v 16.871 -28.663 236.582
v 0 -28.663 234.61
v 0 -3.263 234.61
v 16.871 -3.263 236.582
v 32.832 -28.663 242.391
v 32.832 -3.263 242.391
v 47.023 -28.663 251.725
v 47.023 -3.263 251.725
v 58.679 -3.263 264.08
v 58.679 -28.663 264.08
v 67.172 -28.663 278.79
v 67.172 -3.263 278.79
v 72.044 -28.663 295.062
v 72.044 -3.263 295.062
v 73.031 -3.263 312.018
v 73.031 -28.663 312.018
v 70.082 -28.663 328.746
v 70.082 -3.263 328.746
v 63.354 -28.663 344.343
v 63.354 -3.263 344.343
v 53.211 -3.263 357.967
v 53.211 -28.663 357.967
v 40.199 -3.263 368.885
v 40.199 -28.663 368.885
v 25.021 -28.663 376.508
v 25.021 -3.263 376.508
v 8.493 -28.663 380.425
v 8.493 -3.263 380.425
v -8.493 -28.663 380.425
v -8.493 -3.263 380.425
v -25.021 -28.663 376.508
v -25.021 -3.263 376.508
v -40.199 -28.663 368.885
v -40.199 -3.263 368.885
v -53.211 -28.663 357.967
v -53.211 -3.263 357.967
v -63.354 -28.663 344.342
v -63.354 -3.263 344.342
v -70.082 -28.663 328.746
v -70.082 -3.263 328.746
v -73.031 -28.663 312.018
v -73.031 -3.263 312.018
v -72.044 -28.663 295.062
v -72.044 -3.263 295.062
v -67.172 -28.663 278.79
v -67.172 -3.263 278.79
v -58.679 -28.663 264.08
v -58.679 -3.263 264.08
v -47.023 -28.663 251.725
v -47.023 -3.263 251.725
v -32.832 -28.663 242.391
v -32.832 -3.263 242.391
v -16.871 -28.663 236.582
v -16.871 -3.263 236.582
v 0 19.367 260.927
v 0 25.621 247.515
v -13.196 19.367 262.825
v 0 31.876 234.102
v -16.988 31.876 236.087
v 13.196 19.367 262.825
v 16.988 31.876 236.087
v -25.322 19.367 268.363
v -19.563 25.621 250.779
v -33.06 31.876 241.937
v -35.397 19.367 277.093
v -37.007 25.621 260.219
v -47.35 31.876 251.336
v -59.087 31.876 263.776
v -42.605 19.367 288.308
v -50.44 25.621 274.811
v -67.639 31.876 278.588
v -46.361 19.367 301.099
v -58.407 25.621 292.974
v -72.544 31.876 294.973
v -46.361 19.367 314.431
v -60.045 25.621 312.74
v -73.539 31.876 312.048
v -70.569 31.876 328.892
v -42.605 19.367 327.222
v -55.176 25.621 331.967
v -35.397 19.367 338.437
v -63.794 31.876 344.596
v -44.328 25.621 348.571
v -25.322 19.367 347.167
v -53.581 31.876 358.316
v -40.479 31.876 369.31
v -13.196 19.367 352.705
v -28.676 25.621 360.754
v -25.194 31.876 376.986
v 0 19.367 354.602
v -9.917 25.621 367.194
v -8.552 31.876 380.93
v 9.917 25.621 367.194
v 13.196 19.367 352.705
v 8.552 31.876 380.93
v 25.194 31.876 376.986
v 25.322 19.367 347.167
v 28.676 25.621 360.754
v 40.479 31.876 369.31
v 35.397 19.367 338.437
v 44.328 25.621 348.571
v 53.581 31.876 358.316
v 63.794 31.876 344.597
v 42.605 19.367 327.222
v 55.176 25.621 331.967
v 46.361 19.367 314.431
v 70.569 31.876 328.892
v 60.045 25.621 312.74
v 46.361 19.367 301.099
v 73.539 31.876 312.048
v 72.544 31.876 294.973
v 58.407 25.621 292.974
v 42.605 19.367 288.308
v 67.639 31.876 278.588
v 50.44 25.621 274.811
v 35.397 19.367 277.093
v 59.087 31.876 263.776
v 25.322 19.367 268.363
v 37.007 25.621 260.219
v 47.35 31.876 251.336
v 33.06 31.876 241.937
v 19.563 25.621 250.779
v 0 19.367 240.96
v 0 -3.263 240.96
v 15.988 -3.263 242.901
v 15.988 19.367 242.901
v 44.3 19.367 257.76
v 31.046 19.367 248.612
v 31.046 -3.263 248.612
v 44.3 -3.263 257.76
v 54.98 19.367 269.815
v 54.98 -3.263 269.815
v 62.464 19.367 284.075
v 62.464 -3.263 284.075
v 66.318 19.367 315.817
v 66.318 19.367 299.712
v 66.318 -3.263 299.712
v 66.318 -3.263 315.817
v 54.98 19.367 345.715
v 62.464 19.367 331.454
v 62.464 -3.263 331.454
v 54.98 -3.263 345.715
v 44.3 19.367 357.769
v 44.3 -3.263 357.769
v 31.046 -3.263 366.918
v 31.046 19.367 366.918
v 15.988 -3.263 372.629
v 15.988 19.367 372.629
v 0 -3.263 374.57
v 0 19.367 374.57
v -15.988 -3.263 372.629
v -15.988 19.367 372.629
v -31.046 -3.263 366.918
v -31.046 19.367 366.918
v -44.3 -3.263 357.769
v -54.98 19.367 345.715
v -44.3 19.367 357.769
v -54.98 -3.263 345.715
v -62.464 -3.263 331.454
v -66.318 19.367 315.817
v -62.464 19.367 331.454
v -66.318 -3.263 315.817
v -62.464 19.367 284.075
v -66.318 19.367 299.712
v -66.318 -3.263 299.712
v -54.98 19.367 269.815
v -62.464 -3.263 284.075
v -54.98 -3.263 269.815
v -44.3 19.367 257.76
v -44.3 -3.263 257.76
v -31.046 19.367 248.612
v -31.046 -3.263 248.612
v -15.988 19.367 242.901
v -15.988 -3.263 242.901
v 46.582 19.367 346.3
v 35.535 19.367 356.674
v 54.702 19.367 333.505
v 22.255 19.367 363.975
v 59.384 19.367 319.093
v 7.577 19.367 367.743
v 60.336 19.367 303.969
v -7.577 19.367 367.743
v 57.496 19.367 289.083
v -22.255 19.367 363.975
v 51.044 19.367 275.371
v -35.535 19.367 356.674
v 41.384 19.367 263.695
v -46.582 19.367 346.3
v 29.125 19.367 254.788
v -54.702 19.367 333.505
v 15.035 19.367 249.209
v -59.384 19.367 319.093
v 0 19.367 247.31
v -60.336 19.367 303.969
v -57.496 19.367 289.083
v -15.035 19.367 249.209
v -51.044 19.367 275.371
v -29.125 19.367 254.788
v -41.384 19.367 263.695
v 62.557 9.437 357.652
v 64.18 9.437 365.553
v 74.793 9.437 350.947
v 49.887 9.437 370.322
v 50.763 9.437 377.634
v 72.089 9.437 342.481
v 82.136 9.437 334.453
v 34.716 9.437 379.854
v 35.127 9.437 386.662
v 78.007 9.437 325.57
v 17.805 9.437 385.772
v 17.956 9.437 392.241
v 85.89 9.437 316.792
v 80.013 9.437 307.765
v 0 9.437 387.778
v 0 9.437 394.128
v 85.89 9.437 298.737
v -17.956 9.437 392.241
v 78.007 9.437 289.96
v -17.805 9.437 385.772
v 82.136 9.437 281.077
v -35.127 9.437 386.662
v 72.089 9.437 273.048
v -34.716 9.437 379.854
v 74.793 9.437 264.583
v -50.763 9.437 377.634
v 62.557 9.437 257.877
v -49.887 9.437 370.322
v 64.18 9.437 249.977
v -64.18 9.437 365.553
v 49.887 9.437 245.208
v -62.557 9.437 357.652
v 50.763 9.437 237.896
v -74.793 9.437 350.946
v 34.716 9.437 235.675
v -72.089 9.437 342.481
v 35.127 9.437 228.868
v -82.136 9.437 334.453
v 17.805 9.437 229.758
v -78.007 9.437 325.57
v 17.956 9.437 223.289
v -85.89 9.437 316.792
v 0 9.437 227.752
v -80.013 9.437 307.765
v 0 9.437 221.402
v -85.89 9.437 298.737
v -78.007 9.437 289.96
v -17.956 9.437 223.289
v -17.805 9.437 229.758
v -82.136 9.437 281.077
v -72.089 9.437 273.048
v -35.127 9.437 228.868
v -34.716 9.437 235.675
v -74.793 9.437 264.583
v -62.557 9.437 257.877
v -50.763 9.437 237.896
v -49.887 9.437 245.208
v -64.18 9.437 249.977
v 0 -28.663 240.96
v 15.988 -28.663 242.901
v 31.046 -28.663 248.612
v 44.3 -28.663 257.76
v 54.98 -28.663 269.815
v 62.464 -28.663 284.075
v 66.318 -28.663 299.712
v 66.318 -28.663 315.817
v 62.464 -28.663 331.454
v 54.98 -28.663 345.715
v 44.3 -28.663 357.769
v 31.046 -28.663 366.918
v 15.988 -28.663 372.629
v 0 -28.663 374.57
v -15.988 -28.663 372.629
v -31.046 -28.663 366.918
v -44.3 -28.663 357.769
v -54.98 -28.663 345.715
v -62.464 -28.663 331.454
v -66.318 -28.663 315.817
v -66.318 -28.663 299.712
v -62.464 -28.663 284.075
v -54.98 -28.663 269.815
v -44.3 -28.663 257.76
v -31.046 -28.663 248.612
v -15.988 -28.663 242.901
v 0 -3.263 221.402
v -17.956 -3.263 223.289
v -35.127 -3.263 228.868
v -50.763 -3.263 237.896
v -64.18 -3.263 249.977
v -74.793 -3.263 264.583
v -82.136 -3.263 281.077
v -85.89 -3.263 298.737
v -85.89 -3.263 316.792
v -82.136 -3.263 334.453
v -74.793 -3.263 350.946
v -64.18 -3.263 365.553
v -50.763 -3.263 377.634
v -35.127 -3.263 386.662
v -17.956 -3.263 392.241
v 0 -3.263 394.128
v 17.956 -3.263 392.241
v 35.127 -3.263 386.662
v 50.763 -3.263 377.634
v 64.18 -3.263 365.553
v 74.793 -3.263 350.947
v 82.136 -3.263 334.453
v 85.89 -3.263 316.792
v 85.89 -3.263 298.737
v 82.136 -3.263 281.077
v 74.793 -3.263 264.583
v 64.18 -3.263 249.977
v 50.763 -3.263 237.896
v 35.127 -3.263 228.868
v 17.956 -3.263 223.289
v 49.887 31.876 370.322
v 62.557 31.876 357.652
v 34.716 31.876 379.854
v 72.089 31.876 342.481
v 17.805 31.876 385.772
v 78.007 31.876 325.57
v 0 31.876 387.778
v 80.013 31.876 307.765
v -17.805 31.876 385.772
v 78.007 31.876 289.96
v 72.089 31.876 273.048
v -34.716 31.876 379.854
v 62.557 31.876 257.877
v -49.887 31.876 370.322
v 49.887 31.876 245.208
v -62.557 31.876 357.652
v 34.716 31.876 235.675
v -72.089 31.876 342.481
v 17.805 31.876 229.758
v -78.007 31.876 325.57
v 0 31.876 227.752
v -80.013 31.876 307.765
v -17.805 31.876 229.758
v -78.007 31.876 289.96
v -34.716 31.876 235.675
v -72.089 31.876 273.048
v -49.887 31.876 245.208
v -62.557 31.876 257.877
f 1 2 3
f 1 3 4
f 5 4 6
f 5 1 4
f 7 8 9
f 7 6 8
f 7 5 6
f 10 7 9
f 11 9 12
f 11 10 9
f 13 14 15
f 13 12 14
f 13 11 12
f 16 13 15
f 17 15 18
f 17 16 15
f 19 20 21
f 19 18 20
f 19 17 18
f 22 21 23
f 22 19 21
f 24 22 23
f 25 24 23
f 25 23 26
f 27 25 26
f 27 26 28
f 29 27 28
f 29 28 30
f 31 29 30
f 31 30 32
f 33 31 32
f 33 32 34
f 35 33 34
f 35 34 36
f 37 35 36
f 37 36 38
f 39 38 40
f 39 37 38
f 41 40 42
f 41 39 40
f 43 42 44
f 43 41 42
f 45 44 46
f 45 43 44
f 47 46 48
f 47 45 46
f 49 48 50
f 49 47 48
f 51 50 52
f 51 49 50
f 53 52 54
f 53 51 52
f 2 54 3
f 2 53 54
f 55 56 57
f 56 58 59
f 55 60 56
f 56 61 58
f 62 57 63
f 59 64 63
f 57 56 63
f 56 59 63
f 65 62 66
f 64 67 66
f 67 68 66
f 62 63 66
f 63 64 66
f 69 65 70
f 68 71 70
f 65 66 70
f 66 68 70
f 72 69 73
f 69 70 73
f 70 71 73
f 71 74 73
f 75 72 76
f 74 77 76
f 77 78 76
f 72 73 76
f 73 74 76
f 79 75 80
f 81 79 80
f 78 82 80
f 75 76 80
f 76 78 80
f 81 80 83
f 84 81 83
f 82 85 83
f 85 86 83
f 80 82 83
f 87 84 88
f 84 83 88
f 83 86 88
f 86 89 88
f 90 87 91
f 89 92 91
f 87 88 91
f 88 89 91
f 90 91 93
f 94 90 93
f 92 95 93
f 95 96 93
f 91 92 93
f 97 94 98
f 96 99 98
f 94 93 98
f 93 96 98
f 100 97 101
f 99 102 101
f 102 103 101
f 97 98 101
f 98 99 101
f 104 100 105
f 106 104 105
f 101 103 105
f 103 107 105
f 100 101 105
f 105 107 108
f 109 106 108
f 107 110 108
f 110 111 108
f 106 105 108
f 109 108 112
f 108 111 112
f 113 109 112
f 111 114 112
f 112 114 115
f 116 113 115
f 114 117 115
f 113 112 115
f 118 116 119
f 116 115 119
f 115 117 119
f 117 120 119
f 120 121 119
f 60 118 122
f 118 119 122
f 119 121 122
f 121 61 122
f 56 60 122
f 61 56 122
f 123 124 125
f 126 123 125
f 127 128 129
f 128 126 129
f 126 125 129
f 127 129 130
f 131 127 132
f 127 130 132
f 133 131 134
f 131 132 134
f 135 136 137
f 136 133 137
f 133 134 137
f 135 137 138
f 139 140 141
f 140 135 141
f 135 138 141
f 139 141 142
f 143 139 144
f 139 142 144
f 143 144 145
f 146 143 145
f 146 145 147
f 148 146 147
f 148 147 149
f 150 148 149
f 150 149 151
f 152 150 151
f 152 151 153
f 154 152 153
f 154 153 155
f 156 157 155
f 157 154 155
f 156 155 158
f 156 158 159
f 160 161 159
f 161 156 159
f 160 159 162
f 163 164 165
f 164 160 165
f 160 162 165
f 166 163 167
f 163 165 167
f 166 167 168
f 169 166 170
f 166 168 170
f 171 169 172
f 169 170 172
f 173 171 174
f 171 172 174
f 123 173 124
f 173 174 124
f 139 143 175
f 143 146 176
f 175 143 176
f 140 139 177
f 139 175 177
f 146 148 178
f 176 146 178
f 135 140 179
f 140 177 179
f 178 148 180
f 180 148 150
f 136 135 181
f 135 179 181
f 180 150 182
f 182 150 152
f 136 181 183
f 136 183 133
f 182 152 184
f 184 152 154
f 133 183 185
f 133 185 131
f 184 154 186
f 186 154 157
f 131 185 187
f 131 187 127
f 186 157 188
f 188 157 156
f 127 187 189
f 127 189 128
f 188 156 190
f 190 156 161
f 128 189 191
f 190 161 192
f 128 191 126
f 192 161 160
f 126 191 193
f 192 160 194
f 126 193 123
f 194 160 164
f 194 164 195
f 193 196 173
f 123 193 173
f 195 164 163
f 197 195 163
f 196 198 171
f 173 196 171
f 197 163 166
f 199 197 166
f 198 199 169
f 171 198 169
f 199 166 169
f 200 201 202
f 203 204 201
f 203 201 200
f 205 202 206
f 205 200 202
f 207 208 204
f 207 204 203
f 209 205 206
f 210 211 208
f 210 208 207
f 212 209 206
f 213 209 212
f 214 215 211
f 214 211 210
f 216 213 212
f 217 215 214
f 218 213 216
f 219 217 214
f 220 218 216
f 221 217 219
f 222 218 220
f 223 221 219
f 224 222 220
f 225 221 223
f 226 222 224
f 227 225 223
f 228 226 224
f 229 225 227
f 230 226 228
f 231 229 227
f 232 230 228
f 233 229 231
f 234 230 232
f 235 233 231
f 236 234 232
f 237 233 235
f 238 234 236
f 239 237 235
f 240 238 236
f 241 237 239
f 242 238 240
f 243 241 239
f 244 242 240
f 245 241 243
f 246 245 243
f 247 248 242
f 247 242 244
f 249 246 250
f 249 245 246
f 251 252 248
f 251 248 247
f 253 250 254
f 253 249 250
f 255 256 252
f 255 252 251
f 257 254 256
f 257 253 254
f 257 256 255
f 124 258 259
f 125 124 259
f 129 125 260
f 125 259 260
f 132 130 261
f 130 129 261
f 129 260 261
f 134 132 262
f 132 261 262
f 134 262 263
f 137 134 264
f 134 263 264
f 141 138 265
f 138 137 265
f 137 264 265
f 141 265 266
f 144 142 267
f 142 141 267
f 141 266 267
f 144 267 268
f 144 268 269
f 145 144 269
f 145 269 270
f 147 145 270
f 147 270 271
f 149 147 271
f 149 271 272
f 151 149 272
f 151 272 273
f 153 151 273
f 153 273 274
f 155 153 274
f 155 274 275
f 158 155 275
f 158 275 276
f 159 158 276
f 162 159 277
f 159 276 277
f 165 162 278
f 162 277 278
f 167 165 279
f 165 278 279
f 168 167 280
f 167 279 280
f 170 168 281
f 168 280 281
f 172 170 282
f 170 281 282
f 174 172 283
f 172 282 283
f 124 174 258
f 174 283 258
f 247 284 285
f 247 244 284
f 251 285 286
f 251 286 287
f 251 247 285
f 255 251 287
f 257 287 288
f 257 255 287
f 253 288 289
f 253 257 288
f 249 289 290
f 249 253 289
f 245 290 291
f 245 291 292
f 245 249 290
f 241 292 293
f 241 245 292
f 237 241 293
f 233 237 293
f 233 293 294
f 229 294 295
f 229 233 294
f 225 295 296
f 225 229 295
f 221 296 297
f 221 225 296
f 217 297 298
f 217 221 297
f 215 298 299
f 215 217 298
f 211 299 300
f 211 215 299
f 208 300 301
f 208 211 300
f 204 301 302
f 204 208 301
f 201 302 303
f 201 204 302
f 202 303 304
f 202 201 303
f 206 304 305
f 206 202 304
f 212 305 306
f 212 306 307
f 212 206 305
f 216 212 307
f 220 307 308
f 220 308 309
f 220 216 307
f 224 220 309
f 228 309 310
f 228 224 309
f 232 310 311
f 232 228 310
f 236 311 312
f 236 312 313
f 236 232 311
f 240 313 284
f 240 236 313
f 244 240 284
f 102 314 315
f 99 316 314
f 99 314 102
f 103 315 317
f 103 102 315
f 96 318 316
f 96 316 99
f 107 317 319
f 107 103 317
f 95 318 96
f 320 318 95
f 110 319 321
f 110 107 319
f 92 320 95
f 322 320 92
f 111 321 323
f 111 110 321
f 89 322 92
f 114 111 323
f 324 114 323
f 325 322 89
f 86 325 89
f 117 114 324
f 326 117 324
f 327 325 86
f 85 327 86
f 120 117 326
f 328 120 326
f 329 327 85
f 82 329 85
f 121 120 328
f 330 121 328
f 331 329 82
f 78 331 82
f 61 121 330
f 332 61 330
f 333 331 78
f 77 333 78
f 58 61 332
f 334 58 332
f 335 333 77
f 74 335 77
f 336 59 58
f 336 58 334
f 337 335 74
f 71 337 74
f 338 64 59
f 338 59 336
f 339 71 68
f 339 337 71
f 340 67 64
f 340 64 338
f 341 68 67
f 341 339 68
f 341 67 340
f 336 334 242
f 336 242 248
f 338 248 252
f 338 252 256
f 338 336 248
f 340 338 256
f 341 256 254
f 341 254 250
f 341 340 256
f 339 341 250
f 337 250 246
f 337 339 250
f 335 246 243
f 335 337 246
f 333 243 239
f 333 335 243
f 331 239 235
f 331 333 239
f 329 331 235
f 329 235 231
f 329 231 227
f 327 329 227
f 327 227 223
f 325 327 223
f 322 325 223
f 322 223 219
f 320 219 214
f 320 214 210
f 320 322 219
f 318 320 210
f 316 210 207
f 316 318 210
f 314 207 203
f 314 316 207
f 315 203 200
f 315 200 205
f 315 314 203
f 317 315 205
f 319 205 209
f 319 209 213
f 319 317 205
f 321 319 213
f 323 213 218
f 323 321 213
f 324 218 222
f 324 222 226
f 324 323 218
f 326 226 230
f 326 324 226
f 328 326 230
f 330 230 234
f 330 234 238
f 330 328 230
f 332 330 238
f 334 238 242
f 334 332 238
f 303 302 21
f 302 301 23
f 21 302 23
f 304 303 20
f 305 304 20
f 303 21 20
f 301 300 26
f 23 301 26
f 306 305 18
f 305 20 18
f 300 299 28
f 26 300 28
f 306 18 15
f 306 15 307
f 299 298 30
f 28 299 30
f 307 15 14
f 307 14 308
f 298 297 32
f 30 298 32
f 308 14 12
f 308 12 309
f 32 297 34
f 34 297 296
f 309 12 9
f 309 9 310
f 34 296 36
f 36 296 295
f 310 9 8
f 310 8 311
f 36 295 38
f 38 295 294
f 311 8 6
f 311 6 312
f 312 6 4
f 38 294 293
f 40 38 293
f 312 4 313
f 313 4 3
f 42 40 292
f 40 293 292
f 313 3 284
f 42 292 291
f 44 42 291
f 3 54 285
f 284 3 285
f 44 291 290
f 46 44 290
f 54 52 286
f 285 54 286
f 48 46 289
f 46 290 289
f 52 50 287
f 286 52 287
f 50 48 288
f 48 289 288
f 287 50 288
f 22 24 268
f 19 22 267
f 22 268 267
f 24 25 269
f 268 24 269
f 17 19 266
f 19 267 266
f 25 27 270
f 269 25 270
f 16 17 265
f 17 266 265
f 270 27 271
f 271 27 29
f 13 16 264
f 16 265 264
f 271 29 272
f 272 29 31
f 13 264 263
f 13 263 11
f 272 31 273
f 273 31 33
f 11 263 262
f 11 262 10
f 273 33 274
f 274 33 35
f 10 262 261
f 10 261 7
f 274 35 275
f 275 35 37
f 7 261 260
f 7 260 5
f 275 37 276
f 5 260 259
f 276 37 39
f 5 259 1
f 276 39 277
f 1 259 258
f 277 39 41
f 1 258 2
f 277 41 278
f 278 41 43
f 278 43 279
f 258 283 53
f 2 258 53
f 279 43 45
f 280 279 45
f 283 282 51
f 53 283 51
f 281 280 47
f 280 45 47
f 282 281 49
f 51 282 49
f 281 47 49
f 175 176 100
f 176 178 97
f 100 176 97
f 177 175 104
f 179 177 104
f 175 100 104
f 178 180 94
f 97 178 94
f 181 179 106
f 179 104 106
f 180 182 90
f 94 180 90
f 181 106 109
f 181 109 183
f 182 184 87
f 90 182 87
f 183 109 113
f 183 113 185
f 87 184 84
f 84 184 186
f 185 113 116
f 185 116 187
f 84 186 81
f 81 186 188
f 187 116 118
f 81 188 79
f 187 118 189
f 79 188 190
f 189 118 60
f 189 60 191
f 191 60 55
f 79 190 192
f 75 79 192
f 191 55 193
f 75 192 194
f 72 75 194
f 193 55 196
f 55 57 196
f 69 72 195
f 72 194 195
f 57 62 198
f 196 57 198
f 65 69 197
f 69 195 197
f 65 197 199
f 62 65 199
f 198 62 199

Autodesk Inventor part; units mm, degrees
sketch "Sketch2" plane through (0, 0, 0) normal (0, 1, 0) x (-1, 0, 0)
  line L0 (0, -114.5678) -> (107.9834, -114.5678)
  line L1 (107.9834, -114.5678) -> (107.9834, 108.3126)
  line L2 (107.9834, 108.3126) -> (0, 108.3126)
  line L3 (0, 108.3126) -> (0, -114.5678)
  point P0 (0, 0)
extrude "Extrusion1" [suppressed]
ref_plane "Work Plane4" through (0, -133.7486, -73.152) normal (-1, 0, 0) x (0, 0, 1)
sketch "Sketch3" plane through (0, -133.7486, -73.152) normal (-1, 0, 0) x (0, 0, 1)
  line L0 (6.35, 143.6785) -> (6.35, 121.0486)
  line L1 (6.35, 121.0486) -> (6.35, 95.6486)
  line L2 (0, 95.6486) -> (6.35, 95.6486)
  line L3 (0, 121.0486) -> (-13.208, 121.0486)
  line L4 (-13.208, 121.0486) -> (-13.208, 133.7486) projected
  line L5 (-13.208, 121.0486) -> (-13.208, 133.7486)
  line L6 (-13.208, 133.7486) -> (-6.858, 133.7486)
  line L7 (-6.858, 133.7486) -> (-6.858, 156.1875)
  line L8 (-0.508, 156.1875) -> (26.3176, 143.6785) projected
  line L9 (-6.858, 156.1875) -> (-0.508, 156.1875)
  line L10 (-0.508, 156.1875) -> (26.3176, 143.6785)
  line L11 (12.7, 143.6785) -> (26.3176, 143.6785)
  line L12 (6.35, 143.6785) -> (12.7, 143.6785)
  line L13 (314.1117, 153.1152) -> (314.1117, 130.4853)
  line L14 (314.1117, 130.4853) -> (314.1117, 105.0853)
  line L15 (307.7617, 105.0853) -> (314.1117, 105.0853)
  line L16 (307.7617, 130.4853) -> (294.5537, 130.4853)
  line L17 (294.5537, 130.4853) -> (294.5537, 143.1853)
  line L18 (294.5537, 143.1853) -> (300.9037, 143.1853)
  line L19 (300.9037, 143.1853) -> (300.9037, 165.6242)
  line L20 (307.2537, 165.6242) -> (334.0793, 153.1152)
  line L21 (300.9037, 165.6242) -> (307.2537, 165.6242)
  line L22 (320.4617, 153.1152) -> (334.0793, 153.1152)
  line L23 (314.1117, 153.1152) -> (320.4617, 153.1152)
  line L24 (334.0793, 153.1152) -> (380.9169, 153.1152) construction
  line L25 (380.9169, 153.1152) -> (380.9169, 203.9215) construction
  line L26 (307.7617, 130.4853) -> (307.7617, 105.0853)
  line L27 (0, 121.0486) -> (0, 95.6486)
  line L28 (0, 0) -> (0, 121.0486) projected
  point P0 (73.152, 133.7486)
  dimension "d32" = 6.35
  dimension "d34" = 6.35
  dimension "d35" = 46.8376
revolve "Revolution3" add sketch "Sketch3" angle 360 about axis through (0, 19.3666, 307.7649) along (0, 1, 0) contours L13 L14 L15 L26 L16 L17 L18 L19 L21 L20 L22 L23
ref_plane "Work Plane3" through (0, -133.7486, -73.152) normal (-1, 0, 0) x (0, 0, 1)
sketch "Sketch6" plane through (0, -133.7486, -73.152) normal (-1, 0, 0) x (0, 0, 1)
  line L0 (0, 121.0486) -> (0, 95.6486)
  line L1 (0, 95.6486) -> (6.35, 95.6486)
  line L2 (0, 121.0486) -> (-13.208, 121.0486)
  line L3 (-13.208, 121.0486) -> (-13.208, 133.7486) projected
  line L4 (-13.208, 121.0486) -> (-13.208, 133.7486)
  line L5 (-13.208, 133.7486) -> (-6.858, 133.7486)
  line L6 (-6.858, 133.7486) -> (-6.858, 156.1875)
  line L7 (-0.508, 156.1875) -> (26.3176, 143.6785) projected
  line L8 (-6.858, 156.1875) -> (-0.508, 156.1875)
  line L9 (-0.508, 156.1875) -> (26.3176, 143.6785)
  line L10 (6.35, 95.6486) -> (6.35, 143.68)
  line L11 (6.35, 143.68) -> (26.3176, 143.6785)
  line L12 (26.3176, 143.6785) -> (92.5608, 143.6785) construction
  line L13 (73.152, 133.7486) -> (73.152, 183.9478) construction
  line L14 (119.9864, 143.6785) -> (26.3176, 143.6785) construction
  line L15 (26.3176, 143.6785) -> (73.152, 143.6785) construction
  dimension "d37" = 25.4
  dimension "d38" = 6.35
  dimension "d39" = 6.35
  dimension "d40" = 48.0314
revolve "Revolution4" cut sketch "Sketch6" angle 360 about axis through (0, 0, 0) along (0, 1, 0)
ref_plane "Work Plane2" through (0, 9.93, 0) normal (0, -1, 0) x (1, 0, 0)
sketch "Sketch7" plane through (0, 9.93, 0) normal (0, -1, 0) x (1, 0, 0)
  point P0 (0, 0)
ref_plane "Work Plane1" through (0, 9.93, 0) normal (0, -1, 0) x (1, 0, 0)
sketch "Sketch8" plane through (0, 9.93, 0) normal (0, -1, 0) x (1, 0, 0)
  point P0 (0, 0)
ref_plane "Work Plane5" through (0, 9.93, 0) normal (0, -1, 0) x (1, 0, 0)
sketch "Sketch9" plane through (0, 9.93, 0) normal (0, -1, 0) x (1, 0, 0)
  circle A0 centre (0, 0) radius 60.7129
extrude "Extrusion2" cut sketch "Sketch9" along normal mid plane 25.4
properties part number "part 2 cap of Phenolic Master Sketch" material "Phenolic Resin"
